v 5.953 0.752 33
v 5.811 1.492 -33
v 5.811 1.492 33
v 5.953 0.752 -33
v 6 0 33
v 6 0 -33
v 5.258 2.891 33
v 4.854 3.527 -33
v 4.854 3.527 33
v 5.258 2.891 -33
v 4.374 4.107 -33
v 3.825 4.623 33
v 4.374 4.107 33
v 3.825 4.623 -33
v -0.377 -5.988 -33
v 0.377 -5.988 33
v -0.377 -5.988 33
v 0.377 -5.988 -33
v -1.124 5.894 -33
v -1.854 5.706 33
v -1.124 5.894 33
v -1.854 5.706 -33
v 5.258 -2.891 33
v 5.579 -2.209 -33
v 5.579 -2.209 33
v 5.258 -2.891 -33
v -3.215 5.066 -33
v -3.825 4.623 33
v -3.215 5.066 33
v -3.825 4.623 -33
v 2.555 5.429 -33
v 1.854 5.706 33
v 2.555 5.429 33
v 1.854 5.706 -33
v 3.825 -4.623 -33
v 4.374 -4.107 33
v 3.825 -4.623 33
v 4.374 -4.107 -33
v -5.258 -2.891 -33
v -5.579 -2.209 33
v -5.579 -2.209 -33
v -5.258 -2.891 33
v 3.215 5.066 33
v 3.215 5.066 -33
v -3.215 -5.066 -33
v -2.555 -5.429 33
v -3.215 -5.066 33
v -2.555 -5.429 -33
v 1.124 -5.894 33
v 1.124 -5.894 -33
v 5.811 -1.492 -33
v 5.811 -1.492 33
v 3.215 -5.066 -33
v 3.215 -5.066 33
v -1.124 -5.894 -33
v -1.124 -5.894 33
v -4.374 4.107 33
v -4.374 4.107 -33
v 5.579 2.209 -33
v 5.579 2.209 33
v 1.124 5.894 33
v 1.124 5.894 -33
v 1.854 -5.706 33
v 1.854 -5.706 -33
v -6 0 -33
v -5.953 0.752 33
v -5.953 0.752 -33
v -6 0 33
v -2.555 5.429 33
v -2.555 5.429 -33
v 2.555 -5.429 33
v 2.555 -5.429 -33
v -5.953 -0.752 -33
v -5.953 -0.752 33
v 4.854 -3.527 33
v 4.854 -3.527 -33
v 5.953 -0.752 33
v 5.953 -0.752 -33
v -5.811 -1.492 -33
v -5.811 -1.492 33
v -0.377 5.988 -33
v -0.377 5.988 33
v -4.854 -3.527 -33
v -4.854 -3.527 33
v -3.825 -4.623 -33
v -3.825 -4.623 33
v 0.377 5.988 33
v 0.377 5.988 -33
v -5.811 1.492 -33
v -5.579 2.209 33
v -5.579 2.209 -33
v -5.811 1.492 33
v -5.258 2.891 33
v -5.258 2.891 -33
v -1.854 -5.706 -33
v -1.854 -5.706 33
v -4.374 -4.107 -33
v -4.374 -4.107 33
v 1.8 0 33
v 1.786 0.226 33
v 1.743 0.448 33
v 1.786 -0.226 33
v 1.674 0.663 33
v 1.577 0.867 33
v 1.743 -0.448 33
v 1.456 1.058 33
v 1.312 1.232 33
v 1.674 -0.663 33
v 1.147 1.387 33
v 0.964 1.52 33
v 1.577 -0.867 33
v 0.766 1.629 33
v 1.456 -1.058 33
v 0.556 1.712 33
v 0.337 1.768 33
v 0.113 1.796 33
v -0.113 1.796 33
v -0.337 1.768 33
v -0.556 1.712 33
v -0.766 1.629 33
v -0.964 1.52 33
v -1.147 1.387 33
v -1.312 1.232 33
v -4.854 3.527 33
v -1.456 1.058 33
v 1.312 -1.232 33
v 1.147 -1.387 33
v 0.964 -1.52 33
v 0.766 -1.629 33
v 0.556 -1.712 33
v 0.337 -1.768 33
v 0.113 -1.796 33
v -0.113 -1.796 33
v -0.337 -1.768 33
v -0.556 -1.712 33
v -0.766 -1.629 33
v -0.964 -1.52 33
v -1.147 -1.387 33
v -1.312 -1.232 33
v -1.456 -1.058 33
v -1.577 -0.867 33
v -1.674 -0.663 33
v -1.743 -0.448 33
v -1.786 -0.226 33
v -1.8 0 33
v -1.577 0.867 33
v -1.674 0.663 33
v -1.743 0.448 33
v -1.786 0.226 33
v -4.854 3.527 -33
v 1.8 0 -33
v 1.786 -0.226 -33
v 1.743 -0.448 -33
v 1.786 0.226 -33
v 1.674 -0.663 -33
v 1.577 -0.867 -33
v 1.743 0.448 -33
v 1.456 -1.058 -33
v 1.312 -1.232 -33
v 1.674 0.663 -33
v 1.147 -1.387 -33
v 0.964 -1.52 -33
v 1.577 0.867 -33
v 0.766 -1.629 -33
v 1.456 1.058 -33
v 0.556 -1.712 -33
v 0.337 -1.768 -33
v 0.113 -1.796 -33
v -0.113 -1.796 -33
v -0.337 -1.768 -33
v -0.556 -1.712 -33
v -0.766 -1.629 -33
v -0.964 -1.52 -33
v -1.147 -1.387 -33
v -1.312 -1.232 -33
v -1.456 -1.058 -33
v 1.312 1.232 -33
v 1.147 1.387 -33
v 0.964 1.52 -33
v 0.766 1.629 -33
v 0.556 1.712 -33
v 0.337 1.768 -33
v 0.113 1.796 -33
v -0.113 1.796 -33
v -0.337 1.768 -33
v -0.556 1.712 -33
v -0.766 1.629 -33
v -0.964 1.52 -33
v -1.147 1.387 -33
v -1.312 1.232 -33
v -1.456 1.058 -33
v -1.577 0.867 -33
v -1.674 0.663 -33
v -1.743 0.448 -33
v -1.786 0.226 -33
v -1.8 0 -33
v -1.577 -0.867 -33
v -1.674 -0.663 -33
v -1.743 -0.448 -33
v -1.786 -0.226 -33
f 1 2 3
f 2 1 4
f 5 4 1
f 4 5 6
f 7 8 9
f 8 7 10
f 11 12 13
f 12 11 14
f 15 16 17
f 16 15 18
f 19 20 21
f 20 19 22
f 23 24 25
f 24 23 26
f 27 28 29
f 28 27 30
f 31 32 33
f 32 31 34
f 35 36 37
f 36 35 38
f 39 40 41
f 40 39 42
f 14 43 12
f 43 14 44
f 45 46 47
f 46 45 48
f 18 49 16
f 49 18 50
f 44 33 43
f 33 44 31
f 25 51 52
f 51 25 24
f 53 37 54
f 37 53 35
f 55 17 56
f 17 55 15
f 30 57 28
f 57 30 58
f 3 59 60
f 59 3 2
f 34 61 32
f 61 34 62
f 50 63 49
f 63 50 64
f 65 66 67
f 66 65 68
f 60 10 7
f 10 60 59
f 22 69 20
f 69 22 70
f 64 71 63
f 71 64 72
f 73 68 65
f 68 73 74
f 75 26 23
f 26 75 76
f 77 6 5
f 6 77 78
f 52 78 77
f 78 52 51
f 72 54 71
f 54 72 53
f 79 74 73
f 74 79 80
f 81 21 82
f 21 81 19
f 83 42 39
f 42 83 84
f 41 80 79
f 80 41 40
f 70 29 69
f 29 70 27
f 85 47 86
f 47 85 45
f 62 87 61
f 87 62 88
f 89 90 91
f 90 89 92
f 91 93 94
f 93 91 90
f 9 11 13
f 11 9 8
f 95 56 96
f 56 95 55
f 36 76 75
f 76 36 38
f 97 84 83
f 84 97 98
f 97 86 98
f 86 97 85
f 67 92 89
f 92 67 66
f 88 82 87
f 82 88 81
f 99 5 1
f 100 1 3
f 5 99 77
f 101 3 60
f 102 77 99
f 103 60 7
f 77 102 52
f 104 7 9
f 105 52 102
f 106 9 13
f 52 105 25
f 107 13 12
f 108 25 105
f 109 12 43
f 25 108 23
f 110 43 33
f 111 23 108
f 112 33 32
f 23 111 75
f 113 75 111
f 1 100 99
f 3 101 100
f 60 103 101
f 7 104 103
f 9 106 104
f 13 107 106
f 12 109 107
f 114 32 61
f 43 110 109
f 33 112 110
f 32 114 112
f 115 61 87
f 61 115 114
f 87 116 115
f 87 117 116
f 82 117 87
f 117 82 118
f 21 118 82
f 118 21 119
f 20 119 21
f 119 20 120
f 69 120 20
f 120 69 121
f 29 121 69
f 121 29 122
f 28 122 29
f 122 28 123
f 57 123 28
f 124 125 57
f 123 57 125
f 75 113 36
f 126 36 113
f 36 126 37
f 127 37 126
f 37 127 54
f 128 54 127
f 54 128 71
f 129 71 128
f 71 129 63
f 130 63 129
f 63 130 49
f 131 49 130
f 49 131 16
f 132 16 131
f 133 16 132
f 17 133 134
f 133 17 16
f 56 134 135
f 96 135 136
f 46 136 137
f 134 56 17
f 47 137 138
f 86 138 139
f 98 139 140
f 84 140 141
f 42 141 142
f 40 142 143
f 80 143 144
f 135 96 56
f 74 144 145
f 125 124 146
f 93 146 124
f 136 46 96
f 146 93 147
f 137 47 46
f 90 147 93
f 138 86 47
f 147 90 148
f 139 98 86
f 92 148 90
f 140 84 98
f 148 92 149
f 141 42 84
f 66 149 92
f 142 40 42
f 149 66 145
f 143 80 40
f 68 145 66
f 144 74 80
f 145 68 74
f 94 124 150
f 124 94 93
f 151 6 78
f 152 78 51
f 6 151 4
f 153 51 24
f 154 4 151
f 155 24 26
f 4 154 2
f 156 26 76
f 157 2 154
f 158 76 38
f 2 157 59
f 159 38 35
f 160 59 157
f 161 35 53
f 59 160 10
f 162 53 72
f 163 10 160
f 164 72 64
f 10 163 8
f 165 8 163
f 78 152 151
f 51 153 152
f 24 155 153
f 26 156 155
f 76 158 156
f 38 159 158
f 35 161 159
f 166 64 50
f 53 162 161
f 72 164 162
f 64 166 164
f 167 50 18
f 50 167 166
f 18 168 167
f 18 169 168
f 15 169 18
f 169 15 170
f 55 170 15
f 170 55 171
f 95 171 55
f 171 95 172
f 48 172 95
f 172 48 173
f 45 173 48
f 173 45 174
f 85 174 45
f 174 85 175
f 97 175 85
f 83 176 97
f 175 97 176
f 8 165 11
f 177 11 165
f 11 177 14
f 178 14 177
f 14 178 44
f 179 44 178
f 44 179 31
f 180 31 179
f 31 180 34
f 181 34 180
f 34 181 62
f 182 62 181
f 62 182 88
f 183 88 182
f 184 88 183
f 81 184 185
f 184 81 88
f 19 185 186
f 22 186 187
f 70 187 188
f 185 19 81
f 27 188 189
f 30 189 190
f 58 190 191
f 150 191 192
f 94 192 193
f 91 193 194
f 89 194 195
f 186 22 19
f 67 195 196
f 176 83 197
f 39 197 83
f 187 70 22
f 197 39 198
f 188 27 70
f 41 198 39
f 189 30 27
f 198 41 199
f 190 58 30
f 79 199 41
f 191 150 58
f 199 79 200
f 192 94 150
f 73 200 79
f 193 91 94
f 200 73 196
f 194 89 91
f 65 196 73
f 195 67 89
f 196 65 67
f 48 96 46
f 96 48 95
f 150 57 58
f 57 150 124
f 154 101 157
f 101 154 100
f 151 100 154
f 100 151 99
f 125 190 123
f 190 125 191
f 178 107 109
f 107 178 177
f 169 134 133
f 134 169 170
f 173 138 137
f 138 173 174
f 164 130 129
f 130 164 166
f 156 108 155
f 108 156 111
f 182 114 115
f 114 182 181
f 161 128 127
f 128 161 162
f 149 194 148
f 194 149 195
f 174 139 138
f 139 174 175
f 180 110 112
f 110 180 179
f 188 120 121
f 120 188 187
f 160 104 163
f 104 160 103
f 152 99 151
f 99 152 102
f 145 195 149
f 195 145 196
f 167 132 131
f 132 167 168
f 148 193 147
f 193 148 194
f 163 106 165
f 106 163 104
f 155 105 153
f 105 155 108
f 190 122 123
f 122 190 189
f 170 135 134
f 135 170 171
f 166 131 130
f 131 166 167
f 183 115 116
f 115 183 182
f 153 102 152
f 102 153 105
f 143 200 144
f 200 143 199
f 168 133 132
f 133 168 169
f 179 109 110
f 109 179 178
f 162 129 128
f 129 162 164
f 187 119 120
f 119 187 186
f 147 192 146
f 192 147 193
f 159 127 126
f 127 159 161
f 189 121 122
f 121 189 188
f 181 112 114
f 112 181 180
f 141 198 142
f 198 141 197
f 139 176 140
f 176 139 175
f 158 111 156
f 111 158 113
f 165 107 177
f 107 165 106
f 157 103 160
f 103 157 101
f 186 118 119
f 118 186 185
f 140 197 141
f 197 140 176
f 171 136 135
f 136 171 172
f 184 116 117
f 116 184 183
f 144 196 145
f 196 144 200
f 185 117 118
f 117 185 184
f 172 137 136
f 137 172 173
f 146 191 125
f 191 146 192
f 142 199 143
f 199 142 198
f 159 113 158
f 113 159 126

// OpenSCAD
$fn = 50;


difference() {
	union() {
		translate(v = [0, 0, -33.0000000000]) {
			cylinder(h = 66, r = 6.0000000000);
		}
	}
	union() {
		#translate(v = [0, 0, -100.0000000000]) {
			cylinder(h = 200, r = 1.8000000000);
		}
	}
}
